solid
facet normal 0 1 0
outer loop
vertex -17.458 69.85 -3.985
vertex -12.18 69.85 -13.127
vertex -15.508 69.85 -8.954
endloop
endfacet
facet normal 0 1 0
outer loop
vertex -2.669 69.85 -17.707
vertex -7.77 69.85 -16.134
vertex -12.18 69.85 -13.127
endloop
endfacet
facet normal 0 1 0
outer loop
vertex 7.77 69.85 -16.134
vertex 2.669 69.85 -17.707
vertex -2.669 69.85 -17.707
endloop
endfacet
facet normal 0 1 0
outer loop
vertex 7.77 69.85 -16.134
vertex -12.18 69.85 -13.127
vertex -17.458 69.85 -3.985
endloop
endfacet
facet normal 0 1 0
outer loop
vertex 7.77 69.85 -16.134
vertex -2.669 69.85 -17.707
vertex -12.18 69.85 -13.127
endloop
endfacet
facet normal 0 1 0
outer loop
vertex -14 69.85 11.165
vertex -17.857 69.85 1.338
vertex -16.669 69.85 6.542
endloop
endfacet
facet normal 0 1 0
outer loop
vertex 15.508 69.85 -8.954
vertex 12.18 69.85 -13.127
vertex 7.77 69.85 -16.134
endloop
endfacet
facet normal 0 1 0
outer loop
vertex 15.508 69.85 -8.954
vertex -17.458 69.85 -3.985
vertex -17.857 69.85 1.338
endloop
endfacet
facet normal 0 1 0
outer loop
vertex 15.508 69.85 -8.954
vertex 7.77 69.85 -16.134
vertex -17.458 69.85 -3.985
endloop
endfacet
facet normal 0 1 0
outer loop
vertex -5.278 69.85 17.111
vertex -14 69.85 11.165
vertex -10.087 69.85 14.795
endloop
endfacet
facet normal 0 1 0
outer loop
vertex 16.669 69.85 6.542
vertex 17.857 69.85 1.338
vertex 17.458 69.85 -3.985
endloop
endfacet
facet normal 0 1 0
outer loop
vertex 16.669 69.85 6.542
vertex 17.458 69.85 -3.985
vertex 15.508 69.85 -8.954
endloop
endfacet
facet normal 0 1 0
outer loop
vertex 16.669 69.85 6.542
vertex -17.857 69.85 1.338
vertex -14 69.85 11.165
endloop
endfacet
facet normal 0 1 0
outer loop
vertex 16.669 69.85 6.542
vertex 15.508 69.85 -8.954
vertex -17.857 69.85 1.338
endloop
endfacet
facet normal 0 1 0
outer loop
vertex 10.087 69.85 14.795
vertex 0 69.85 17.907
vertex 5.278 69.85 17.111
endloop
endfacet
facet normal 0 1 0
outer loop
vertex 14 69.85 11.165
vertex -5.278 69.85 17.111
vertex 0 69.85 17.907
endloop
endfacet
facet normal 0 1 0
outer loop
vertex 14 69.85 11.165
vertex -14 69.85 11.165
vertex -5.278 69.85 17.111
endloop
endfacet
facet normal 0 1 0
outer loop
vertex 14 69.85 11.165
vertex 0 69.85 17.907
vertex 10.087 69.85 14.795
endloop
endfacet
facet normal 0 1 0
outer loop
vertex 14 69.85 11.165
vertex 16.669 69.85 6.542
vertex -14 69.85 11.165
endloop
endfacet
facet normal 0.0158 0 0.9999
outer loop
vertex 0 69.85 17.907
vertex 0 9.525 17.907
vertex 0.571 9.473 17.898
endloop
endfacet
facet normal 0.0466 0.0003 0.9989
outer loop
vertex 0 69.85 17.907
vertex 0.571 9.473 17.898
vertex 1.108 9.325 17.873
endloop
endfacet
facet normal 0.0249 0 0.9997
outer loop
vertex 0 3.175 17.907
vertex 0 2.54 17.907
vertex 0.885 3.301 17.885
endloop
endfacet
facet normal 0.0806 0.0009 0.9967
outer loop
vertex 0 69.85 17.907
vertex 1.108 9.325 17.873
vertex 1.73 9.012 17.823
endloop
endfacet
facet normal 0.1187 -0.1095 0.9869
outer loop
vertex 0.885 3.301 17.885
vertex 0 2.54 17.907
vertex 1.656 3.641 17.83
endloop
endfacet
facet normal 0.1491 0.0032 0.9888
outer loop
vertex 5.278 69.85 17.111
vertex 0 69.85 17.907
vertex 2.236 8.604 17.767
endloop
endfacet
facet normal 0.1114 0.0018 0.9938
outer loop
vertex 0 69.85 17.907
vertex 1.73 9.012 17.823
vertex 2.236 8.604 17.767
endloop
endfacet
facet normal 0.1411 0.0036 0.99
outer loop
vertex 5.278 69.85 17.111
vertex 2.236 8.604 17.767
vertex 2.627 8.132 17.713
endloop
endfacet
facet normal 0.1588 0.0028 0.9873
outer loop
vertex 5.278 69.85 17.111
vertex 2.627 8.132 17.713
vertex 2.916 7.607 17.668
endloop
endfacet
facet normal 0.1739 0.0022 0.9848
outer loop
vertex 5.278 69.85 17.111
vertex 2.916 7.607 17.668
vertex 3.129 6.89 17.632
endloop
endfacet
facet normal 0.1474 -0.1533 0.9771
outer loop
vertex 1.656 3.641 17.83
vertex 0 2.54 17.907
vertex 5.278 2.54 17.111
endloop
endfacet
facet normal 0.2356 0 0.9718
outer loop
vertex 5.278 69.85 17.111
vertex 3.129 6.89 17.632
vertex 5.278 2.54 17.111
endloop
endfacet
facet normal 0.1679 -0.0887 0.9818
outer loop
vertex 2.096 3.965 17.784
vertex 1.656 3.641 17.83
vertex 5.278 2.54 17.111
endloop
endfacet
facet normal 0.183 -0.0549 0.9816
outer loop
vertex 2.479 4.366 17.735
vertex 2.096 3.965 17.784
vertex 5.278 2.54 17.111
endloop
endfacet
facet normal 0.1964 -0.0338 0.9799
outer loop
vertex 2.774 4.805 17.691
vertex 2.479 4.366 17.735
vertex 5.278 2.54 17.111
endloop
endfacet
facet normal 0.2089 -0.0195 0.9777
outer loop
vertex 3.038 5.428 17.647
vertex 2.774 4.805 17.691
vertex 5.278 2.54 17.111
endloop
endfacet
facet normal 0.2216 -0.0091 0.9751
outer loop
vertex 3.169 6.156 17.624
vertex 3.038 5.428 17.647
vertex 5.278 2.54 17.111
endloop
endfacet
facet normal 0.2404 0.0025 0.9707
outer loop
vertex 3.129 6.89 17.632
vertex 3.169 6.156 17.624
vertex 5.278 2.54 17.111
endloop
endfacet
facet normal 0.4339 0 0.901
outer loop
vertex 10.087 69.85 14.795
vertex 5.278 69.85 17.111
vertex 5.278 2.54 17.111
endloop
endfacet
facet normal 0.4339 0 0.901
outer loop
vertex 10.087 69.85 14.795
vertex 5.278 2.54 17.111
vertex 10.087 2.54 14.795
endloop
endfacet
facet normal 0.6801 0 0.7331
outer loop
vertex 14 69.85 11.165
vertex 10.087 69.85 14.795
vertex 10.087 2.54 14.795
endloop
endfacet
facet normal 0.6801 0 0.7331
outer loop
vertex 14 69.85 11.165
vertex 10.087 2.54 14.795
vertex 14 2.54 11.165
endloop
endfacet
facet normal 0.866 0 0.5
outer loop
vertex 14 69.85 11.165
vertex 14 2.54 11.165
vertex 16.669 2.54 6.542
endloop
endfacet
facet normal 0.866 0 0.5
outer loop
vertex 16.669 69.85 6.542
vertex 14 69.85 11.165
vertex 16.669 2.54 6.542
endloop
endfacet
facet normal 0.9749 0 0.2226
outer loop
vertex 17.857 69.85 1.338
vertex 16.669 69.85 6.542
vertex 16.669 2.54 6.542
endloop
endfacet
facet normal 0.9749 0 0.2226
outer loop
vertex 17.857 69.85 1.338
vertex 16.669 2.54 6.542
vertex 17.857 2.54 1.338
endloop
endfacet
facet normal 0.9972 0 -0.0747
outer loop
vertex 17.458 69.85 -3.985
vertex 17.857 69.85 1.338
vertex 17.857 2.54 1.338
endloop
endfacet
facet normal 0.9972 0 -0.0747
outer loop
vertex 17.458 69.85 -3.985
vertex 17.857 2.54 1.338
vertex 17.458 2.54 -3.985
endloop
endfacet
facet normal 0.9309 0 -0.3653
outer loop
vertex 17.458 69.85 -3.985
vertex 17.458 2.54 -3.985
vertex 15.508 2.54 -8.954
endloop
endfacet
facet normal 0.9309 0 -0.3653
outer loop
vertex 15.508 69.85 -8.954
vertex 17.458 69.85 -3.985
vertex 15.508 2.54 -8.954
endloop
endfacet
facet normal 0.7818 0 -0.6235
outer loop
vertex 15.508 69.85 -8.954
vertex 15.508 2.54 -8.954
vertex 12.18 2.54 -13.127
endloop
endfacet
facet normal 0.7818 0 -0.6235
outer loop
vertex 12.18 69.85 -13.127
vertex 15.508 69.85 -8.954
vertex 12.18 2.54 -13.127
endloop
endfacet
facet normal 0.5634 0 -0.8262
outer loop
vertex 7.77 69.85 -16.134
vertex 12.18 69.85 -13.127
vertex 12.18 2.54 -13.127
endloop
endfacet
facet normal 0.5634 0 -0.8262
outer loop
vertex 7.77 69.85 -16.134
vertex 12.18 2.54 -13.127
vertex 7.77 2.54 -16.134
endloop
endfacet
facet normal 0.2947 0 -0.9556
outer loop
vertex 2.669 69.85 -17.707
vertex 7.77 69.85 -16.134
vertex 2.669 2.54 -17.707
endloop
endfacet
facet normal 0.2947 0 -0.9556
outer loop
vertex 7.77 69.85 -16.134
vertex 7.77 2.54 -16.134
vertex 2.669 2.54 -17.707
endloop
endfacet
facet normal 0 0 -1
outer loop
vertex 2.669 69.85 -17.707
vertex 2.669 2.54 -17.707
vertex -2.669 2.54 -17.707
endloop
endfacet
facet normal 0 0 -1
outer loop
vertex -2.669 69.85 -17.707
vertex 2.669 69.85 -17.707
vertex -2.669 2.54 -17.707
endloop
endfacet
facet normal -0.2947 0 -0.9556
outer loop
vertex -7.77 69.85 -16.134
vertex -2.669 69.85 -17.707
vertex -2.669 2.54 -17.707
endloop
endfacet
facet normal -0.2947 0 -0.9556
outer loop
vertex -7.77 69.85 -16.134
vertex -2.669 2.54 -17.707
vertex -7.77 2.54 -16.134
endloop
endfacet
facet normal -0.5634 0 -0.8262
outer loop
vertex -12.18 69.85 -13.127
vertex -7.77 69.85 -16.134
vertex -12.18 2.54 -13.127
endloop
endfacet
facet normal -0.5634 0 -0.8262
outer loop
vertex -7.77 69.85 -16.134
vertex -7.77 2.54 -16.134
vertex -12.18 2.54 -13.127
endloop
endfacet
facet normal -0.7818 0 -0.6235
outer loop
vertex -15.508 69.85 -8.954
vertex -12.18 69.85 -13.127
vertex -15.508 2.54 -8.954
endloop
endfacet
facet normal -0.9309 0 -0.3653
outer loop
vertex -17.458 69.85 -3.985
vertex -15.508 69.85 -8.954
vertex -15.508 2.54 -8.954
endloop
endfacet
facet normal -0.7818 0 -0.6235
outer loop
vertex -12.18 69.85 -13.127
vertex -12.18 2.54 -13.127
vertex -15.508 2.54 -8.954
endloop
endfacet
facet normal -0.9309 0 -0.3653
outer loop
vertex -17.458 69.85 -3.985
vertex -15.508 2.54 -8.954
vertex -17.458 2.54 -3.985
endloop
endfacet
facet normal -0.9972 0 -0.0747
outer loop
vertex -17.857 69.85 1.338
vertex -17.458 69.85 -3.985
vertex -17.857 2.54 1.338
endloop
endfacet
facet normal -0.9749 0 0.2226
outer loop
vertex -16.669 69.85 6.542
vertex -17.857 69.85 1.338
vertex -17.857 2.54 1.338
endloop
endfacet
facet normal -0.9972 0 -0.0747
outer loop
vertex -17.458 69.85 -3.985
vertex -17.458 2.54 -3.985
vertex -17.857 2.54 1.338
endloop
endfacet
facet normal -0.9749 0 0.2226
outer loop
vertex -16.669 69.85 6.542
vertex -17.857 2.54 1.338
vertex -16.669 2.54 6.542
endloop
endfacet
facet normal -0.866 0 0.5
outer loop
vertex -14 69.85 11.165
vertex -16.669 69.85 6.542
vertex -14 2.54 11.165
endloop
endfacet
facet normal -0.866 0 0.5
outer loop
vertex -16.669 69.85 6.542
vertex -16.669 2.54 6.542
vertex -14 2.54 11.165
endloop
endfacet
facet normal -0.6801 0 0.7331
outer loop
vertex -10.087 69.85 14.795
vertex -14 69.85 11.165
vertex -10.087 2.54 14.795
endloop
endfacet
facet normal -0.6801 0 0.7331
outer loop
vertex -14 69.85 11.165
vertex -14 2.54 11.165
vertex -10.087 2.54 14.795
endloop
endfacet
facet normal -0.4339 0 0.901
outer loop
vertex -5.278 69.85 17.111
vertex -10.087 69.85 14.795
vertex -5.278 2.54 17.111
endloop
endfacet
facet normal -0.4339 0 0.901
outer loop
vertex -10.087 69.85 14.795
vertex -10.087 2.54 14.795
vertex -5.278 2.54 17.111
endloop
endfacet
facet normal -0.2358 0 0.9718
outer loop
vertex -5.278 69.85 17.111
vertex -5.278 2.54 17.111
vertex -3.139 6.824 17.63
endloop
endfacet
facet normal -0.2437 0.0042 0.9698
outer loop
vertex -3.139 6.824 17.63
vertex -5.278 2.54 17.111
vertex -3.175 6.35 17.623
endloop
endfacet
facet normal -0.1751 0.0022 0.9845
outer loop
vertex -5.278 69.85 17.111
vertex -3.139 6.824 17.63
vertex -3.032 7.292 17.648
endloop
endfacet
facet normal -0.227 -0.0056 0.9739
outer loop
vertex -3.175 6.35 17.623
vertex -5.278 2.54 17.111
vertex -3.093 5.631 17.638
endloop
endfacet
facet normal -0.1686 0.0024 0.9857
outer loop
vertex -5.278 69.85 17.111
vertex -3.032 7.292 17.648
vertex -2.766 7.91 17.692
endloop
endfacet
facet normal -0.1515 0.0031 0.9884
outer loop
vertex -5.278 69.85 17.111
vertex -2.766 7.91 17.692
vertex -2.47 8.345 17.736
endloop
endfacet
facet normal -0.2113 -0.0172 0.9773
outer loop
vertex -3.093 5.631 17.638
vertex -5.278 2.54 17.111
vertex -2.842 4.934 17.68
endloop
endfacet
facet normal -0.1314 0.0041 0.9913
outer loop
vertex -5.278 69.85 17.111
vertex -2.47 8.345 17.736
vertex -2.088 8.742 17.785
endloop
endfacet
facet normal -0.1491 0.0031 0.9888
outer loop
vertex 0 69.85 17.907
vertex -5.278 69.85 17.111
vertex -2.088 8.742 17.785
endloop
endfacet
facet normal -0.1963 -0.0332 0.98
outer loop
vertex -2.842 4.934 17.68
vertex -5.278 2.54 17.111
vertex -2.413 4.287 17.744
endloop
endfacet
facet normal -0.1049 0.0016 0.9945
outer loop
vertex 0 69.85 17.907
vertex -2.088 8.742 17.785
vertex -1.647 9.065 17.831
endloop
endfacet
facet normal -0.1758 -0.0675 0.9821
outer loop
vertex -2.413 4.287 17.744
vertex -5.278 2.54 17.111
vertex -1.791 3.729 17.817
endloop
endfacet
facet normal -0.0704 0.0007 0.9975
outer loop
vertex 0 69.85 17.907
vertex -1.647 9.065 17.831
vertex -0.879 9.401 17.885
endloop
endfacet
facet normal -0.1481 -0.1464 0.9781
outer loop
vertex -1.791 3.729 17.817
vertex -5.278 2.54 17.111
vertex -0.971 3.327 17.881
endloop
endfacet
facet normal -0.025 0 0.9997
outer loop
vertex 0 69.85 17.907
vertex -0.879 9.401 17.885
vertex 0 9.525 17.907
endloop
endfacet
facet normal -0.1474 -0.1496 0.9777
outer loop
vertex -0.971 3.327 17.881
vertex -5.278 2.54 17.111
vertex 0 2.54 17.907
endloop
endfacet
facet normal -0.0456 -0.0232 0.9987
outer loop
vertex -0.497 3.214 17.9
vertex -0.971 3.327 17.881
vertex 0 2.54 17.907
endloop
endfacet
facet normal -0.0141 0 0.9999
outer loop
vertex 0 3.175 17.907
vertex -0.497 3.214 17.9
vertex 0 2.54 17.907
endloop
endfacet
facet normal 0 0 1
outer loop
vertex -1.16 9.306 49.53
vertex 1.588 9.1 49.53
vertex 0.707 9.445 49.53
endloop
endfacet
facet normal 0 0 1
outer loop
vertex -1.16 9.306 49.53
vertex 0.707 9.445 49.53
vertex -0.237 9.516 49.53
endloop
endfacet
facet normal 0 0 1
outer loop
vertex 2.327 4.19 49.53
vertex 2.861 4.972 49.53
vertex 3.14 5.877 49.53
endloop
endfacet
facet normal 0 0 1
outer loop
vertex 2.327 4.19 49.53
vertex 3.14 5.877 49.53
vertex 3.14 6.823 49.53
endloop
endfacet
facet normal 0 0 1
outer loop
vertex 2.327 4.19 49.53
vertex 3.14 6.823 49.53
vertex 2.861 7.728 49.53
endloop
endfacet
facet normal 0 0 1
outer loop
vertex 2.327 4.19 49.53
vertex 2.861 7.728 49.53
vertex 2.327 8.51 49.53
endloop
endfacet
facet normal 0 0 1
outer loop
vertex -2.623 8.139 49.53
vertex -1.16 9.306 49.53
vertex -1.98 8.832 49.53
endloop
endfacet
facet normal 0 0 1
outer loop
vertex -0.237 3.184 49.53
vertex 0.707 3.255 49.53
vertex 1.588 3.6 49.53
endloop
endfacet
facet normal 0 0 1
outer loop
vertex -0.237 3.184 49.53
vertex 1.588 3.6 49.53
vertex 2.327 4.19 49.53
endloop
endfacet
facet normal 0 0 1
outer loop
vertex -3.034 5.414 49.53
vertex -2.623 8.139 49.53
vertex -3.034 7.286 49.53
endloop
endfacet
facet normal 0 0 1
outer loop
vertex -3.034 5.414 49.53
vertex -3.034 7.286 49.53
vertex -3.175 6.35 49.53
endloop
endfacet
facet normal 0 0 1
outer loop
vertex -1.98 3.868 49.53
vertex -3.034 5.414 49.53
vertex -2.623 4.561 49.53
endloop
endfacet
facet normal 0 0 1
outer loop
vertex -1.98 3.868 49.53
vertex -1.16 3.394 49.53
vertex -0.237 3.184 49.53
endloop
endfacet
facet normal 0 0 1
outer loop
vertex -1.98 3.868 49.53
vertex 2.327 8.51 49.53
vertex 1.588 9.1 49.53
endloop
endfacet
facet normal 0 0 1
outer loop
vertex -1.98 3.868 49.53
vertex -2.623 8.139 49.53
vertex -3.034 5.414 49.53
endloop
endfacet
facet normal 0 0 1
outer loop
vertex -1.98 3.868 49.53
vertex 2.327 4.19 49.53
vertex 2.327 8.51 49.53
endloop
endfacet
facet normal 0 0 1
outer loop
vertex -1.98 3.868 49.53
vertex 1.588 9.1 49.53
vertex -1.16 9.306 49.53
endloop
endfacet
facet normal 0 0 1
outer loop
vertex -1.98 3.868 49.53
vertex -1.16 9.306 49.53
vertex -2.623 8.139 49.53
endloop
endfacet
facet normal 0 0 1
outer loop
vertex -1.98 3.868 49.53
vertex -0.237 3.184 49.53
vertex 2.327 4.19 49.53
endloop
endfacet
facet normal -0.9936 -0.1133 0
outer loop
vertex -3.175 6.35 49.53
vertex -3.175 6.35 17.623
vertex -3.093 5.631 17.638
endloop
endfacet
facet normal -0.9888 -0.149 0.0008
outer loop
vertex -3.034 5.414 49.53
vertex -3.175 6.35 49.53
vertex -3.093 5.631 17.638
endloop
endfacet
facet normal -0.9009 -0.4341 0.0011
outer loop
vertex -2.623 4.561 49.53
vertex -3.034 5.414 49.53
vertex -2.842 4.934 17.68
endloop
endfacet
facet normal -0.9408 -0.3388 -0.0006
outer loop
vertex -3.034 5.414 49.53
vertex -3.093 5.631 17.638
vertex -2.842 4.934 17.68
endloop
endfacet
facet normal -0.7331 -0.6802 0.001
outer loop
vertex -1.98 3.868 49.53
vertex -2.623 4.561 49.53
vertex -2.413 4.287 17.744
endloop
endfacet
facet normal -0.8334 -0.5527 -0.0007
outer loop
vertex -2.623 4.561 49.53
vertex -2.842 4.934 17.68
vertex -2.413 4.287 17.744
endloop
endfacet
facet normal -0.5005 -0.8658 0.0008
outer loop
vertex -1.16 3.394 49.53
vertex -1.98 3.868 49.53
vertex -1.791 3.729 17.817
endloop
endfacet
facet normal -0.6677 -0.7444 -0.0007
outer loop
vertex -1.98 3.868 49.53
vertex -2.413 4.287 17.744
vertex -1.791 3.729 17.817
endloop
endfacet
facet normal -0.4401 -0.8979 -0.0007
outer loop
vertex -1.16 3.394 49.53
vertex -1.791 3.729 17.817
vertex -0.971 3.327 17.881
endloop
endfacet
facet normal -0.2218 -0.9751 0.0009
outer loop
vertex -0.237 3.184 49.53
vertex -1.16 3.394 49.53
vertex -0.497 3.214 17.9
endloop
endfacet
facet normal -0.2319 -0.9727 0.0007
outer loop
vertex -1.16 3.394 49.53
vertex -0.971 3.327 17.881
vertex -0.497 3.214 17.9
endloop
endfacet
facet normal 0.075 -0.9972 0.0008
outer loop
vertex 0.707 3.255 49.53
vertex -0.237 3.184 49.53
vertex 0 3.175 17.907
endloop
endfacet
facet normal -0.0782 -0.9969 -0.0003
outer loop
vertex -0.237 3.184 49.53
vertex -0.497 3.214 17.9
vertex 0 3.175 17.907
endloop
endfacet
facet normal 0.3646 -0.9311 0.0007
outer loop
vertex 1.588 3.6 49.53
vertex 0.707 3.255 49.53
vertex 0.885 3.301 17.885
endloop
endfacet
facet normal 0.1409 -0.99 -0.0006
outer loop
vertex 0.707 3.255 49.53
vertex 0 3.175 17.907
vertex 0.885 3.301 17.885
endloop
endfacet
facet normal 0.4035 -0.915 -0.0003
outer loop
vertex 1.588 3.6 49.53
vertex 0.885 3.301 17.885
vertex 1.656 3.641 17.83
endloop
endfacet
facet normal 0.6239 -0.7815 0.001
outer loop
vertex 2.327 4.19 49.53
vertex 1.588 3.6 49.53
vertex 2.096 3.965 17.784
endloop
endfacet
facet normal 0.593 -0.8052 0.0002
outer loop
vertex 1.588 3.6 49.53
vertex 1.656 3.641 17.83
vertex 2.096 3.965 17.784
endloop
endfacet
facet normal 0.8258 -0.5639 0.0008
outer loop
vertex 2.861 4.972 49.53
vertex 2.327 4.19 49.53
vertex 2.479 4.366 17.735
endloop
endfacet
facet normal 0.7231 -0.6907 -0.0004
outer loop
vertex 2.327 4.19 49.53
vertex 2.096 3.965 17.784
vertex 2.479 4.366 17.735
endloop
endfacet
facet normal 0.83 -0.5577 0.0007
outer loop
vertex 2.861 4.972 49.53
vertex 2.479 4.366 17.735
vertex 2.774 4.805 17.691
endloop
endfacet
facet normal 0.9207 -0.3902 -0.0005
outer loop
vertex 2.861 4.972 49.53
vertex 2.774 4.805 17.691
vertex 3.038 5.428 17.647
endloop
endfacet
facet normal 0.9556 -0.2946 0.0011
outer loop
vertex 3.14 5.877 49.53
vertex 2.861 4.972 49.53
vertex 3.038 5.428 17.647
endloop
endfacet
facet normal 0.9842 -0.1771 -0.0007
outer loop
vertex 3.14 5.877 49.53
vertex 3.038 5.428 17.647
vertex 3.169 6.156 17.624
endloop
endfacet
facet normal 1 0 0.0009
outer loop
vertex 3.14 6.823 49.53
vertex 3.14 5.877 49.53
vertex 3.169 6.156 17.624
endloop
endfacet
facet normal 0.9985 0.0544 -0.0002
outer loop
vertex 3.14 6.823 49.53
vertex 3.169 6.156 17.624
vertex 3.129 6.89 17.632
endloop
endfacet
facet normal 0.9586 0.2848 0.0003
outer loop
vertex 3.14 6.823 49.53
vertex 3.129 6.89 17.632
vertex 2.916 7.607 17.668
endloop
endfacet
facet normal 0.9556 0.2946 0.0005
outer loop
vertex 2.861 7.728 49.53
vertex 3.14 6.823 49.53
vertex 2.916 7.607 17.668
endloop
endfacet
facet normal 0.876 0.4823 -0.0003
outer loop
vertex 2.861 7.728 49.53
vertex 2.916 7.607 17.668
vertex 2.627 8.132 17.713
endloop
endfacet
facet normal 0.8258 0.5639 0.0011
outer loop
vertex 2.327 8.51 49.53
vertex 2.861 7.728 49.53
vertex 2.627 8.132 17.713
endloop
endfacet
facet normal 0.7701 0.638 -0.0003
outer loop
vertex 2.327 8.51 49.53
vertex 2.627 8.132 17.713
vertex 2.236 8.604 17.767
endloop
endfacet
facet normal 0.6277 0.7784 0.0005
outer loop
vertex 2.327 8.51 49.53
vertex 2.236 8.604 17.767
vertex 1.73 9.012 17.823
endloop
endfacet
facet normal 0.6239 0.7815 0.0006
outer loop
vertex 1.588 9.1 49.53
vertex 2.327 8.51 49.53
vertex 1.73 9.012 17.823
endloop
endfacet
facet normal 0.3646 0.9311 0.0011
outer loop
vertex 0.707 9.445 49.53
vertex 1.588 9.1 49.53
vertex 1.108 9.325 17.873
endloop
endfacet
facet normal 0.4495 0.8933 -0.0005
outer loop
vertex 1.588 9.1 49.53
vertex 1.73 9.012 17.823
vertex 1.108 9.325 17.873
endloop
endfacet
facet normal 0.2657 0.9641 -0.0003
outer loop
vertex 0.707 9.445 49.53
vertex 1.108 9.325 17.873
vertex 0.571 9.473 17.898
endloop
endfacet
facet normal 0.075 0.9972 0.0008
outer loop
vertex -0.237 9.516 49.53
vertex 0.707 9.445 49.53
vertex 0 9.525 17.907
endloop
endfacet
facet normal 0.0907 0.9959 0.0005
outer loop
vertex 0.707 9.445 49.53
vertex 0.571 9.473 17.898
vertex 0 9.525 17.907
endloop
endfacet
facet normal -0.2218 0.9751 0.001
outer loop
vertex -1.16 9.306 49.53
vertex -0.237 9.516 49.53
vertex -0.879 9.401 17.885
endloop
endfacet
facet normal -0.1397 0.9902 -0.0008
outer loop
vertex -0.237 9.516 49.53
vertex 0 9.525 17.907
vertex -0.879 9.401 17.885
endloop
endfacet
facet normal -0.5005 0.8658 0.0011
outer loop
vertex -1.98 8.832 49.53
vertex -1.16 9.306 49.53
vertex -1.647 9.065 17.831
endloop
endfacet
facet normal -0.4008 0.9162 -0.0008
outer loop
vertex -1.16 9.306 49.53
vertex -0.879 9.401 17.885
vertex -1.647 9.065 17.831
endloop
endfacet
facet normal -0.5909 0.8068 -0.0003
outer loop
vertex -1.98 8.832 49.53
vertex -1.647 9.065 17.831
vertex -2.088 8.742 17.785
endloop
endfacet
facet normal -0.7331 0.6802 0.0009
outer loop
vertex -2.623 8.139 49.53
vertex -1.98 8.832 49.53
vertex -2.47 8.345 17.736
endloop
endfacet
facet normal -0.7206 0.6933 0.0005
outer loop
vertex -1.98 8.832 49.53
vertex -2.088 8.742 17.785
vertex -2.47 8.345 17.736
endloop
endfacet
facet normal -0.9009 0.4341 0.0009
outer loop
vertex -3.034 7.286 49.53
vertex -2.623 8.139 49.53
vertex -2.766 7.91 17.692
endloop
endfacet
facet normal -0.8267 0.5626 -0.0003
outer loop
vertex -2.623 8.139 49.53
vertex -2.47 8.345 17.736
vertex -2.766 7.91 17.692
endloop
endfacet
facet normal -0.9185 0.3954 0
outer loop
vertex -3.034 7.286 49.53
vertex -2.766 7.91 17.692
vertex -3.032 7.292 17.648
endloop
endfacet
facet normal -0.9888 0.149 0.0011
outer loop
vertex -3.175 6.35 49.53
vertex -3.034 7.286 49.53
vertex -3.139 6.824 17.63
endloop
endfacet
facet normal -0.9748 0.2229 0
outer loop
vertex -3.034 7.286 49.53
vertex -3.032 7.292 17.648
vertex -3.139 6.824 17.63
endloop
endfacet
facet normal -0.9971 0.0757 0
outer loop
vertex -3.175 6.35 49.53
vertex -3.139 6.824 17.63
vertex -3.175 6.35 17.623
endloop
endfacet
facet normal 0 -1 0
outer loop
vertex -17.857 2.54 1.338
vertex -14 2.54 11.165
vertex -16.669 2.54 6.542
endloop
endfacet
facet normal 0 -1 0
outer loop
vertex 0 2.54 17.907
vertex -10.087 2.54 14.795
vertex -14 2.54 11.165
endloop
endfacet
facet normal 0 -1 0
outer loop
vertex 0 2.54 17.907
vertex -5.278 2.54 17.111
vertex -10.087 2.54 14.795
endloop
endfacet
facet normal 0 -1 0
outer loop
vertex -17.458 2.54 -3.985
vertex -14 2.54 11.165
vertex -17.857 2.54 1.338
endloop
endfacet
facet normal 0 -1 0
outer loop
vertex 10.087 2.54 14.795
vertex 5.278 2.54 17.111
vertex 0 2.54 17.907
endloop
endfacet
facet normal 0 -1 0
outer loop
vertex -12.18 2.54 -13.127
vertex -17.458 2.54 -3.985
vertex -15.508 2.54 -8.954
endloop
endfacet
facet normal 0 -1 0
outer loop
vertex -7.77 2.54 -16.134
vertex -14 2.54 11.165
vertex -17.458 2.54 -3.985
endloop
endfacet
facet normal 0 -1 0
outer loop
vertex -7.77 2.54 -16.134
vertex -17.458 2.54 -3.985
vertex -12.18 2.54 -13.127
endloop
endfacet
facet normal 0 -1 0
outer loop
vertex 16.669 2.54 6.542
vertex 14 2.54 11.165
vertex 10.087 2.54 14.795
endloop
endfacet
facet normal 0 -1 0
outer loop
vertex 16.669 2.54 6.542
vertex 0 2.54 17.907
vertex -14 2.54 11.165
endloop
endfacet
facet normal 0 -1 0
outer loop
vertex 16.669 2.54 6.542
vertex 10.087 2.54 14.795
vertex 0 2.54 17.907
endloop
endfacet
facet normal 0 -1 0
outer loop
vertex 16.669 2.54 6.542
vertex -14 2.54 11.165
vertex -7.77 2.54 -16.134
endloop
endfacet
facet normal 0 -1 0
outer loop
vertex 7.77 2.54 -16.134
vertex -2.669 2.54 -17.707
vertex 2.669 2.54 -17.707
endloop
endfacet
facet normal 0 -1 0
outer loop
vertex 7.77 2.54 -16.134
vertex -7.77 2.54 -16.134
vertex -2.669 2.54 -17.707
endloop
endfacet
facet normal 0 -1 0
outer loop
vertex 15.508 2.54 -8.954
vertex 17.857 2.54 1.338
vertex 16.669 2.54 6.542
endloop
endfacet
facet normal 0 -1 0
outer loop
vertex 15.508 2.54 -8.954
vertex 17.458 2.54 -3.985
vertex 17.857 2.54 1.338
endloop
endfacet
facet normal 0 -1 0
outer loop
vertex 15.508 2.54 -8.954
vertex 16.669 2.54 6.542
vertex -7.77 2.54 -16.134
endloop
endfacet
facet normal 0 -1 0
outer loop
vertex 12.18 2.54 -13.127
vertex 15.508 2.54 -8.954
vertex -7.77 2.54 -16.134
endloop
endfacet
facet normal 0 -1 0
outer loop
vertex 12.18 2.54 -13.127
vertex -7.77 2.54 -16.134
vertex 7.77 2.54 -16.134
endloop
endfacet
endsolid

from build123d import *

# Parameters (mm, degrees)
SKETCH2_R           = 17.907
BOSS_EXTRUDE1_DEPTH = 69.85
SKETCH3_R           = 3.175
BOSS_EXTRUDE2_DEPTH = 49.53
SKETCH4_R           = 17.907
CUT_EXTRUDE1_DEPTH  = 2.54


with BuildPart() as part:
    # Sketch2 → Boss-Extrude1 (new body)
    with BuildSketch(Plane(origin=(0, 0, 0), x_dir=(1, 0, 0), z_dir=(0, 1, 0))):
        with Locations(Location((0, 0, 0), (0, 0, 270))):
            Circle(SKETCH2_R)
    extrude(amount=BOSS_EXTRUDE1_DEPTH)

    # Sketch3 → Boss-Extrude2 (add)
    with BuildSketch(Plane.XY):
        with Locations(Location((0, 6.35, 0), (0, 0, 180))):
            Circle(SKETCH3_R)
    extrude(amount=BOSS_EXTRUDE2_DEPTH)

    # Sketch4 → Cut-Extrude1 (cut)
    with BuildSketch(Plane.XZ):
        with Locations(Location((0, 0, 0), (0, 0, 270))):
            Circle(SKETCH4_R)
    extrude(amount=-CUT_EXTRUDE1_DEPTH, mode=Mode.SUBTRACT)


solid = part.part
